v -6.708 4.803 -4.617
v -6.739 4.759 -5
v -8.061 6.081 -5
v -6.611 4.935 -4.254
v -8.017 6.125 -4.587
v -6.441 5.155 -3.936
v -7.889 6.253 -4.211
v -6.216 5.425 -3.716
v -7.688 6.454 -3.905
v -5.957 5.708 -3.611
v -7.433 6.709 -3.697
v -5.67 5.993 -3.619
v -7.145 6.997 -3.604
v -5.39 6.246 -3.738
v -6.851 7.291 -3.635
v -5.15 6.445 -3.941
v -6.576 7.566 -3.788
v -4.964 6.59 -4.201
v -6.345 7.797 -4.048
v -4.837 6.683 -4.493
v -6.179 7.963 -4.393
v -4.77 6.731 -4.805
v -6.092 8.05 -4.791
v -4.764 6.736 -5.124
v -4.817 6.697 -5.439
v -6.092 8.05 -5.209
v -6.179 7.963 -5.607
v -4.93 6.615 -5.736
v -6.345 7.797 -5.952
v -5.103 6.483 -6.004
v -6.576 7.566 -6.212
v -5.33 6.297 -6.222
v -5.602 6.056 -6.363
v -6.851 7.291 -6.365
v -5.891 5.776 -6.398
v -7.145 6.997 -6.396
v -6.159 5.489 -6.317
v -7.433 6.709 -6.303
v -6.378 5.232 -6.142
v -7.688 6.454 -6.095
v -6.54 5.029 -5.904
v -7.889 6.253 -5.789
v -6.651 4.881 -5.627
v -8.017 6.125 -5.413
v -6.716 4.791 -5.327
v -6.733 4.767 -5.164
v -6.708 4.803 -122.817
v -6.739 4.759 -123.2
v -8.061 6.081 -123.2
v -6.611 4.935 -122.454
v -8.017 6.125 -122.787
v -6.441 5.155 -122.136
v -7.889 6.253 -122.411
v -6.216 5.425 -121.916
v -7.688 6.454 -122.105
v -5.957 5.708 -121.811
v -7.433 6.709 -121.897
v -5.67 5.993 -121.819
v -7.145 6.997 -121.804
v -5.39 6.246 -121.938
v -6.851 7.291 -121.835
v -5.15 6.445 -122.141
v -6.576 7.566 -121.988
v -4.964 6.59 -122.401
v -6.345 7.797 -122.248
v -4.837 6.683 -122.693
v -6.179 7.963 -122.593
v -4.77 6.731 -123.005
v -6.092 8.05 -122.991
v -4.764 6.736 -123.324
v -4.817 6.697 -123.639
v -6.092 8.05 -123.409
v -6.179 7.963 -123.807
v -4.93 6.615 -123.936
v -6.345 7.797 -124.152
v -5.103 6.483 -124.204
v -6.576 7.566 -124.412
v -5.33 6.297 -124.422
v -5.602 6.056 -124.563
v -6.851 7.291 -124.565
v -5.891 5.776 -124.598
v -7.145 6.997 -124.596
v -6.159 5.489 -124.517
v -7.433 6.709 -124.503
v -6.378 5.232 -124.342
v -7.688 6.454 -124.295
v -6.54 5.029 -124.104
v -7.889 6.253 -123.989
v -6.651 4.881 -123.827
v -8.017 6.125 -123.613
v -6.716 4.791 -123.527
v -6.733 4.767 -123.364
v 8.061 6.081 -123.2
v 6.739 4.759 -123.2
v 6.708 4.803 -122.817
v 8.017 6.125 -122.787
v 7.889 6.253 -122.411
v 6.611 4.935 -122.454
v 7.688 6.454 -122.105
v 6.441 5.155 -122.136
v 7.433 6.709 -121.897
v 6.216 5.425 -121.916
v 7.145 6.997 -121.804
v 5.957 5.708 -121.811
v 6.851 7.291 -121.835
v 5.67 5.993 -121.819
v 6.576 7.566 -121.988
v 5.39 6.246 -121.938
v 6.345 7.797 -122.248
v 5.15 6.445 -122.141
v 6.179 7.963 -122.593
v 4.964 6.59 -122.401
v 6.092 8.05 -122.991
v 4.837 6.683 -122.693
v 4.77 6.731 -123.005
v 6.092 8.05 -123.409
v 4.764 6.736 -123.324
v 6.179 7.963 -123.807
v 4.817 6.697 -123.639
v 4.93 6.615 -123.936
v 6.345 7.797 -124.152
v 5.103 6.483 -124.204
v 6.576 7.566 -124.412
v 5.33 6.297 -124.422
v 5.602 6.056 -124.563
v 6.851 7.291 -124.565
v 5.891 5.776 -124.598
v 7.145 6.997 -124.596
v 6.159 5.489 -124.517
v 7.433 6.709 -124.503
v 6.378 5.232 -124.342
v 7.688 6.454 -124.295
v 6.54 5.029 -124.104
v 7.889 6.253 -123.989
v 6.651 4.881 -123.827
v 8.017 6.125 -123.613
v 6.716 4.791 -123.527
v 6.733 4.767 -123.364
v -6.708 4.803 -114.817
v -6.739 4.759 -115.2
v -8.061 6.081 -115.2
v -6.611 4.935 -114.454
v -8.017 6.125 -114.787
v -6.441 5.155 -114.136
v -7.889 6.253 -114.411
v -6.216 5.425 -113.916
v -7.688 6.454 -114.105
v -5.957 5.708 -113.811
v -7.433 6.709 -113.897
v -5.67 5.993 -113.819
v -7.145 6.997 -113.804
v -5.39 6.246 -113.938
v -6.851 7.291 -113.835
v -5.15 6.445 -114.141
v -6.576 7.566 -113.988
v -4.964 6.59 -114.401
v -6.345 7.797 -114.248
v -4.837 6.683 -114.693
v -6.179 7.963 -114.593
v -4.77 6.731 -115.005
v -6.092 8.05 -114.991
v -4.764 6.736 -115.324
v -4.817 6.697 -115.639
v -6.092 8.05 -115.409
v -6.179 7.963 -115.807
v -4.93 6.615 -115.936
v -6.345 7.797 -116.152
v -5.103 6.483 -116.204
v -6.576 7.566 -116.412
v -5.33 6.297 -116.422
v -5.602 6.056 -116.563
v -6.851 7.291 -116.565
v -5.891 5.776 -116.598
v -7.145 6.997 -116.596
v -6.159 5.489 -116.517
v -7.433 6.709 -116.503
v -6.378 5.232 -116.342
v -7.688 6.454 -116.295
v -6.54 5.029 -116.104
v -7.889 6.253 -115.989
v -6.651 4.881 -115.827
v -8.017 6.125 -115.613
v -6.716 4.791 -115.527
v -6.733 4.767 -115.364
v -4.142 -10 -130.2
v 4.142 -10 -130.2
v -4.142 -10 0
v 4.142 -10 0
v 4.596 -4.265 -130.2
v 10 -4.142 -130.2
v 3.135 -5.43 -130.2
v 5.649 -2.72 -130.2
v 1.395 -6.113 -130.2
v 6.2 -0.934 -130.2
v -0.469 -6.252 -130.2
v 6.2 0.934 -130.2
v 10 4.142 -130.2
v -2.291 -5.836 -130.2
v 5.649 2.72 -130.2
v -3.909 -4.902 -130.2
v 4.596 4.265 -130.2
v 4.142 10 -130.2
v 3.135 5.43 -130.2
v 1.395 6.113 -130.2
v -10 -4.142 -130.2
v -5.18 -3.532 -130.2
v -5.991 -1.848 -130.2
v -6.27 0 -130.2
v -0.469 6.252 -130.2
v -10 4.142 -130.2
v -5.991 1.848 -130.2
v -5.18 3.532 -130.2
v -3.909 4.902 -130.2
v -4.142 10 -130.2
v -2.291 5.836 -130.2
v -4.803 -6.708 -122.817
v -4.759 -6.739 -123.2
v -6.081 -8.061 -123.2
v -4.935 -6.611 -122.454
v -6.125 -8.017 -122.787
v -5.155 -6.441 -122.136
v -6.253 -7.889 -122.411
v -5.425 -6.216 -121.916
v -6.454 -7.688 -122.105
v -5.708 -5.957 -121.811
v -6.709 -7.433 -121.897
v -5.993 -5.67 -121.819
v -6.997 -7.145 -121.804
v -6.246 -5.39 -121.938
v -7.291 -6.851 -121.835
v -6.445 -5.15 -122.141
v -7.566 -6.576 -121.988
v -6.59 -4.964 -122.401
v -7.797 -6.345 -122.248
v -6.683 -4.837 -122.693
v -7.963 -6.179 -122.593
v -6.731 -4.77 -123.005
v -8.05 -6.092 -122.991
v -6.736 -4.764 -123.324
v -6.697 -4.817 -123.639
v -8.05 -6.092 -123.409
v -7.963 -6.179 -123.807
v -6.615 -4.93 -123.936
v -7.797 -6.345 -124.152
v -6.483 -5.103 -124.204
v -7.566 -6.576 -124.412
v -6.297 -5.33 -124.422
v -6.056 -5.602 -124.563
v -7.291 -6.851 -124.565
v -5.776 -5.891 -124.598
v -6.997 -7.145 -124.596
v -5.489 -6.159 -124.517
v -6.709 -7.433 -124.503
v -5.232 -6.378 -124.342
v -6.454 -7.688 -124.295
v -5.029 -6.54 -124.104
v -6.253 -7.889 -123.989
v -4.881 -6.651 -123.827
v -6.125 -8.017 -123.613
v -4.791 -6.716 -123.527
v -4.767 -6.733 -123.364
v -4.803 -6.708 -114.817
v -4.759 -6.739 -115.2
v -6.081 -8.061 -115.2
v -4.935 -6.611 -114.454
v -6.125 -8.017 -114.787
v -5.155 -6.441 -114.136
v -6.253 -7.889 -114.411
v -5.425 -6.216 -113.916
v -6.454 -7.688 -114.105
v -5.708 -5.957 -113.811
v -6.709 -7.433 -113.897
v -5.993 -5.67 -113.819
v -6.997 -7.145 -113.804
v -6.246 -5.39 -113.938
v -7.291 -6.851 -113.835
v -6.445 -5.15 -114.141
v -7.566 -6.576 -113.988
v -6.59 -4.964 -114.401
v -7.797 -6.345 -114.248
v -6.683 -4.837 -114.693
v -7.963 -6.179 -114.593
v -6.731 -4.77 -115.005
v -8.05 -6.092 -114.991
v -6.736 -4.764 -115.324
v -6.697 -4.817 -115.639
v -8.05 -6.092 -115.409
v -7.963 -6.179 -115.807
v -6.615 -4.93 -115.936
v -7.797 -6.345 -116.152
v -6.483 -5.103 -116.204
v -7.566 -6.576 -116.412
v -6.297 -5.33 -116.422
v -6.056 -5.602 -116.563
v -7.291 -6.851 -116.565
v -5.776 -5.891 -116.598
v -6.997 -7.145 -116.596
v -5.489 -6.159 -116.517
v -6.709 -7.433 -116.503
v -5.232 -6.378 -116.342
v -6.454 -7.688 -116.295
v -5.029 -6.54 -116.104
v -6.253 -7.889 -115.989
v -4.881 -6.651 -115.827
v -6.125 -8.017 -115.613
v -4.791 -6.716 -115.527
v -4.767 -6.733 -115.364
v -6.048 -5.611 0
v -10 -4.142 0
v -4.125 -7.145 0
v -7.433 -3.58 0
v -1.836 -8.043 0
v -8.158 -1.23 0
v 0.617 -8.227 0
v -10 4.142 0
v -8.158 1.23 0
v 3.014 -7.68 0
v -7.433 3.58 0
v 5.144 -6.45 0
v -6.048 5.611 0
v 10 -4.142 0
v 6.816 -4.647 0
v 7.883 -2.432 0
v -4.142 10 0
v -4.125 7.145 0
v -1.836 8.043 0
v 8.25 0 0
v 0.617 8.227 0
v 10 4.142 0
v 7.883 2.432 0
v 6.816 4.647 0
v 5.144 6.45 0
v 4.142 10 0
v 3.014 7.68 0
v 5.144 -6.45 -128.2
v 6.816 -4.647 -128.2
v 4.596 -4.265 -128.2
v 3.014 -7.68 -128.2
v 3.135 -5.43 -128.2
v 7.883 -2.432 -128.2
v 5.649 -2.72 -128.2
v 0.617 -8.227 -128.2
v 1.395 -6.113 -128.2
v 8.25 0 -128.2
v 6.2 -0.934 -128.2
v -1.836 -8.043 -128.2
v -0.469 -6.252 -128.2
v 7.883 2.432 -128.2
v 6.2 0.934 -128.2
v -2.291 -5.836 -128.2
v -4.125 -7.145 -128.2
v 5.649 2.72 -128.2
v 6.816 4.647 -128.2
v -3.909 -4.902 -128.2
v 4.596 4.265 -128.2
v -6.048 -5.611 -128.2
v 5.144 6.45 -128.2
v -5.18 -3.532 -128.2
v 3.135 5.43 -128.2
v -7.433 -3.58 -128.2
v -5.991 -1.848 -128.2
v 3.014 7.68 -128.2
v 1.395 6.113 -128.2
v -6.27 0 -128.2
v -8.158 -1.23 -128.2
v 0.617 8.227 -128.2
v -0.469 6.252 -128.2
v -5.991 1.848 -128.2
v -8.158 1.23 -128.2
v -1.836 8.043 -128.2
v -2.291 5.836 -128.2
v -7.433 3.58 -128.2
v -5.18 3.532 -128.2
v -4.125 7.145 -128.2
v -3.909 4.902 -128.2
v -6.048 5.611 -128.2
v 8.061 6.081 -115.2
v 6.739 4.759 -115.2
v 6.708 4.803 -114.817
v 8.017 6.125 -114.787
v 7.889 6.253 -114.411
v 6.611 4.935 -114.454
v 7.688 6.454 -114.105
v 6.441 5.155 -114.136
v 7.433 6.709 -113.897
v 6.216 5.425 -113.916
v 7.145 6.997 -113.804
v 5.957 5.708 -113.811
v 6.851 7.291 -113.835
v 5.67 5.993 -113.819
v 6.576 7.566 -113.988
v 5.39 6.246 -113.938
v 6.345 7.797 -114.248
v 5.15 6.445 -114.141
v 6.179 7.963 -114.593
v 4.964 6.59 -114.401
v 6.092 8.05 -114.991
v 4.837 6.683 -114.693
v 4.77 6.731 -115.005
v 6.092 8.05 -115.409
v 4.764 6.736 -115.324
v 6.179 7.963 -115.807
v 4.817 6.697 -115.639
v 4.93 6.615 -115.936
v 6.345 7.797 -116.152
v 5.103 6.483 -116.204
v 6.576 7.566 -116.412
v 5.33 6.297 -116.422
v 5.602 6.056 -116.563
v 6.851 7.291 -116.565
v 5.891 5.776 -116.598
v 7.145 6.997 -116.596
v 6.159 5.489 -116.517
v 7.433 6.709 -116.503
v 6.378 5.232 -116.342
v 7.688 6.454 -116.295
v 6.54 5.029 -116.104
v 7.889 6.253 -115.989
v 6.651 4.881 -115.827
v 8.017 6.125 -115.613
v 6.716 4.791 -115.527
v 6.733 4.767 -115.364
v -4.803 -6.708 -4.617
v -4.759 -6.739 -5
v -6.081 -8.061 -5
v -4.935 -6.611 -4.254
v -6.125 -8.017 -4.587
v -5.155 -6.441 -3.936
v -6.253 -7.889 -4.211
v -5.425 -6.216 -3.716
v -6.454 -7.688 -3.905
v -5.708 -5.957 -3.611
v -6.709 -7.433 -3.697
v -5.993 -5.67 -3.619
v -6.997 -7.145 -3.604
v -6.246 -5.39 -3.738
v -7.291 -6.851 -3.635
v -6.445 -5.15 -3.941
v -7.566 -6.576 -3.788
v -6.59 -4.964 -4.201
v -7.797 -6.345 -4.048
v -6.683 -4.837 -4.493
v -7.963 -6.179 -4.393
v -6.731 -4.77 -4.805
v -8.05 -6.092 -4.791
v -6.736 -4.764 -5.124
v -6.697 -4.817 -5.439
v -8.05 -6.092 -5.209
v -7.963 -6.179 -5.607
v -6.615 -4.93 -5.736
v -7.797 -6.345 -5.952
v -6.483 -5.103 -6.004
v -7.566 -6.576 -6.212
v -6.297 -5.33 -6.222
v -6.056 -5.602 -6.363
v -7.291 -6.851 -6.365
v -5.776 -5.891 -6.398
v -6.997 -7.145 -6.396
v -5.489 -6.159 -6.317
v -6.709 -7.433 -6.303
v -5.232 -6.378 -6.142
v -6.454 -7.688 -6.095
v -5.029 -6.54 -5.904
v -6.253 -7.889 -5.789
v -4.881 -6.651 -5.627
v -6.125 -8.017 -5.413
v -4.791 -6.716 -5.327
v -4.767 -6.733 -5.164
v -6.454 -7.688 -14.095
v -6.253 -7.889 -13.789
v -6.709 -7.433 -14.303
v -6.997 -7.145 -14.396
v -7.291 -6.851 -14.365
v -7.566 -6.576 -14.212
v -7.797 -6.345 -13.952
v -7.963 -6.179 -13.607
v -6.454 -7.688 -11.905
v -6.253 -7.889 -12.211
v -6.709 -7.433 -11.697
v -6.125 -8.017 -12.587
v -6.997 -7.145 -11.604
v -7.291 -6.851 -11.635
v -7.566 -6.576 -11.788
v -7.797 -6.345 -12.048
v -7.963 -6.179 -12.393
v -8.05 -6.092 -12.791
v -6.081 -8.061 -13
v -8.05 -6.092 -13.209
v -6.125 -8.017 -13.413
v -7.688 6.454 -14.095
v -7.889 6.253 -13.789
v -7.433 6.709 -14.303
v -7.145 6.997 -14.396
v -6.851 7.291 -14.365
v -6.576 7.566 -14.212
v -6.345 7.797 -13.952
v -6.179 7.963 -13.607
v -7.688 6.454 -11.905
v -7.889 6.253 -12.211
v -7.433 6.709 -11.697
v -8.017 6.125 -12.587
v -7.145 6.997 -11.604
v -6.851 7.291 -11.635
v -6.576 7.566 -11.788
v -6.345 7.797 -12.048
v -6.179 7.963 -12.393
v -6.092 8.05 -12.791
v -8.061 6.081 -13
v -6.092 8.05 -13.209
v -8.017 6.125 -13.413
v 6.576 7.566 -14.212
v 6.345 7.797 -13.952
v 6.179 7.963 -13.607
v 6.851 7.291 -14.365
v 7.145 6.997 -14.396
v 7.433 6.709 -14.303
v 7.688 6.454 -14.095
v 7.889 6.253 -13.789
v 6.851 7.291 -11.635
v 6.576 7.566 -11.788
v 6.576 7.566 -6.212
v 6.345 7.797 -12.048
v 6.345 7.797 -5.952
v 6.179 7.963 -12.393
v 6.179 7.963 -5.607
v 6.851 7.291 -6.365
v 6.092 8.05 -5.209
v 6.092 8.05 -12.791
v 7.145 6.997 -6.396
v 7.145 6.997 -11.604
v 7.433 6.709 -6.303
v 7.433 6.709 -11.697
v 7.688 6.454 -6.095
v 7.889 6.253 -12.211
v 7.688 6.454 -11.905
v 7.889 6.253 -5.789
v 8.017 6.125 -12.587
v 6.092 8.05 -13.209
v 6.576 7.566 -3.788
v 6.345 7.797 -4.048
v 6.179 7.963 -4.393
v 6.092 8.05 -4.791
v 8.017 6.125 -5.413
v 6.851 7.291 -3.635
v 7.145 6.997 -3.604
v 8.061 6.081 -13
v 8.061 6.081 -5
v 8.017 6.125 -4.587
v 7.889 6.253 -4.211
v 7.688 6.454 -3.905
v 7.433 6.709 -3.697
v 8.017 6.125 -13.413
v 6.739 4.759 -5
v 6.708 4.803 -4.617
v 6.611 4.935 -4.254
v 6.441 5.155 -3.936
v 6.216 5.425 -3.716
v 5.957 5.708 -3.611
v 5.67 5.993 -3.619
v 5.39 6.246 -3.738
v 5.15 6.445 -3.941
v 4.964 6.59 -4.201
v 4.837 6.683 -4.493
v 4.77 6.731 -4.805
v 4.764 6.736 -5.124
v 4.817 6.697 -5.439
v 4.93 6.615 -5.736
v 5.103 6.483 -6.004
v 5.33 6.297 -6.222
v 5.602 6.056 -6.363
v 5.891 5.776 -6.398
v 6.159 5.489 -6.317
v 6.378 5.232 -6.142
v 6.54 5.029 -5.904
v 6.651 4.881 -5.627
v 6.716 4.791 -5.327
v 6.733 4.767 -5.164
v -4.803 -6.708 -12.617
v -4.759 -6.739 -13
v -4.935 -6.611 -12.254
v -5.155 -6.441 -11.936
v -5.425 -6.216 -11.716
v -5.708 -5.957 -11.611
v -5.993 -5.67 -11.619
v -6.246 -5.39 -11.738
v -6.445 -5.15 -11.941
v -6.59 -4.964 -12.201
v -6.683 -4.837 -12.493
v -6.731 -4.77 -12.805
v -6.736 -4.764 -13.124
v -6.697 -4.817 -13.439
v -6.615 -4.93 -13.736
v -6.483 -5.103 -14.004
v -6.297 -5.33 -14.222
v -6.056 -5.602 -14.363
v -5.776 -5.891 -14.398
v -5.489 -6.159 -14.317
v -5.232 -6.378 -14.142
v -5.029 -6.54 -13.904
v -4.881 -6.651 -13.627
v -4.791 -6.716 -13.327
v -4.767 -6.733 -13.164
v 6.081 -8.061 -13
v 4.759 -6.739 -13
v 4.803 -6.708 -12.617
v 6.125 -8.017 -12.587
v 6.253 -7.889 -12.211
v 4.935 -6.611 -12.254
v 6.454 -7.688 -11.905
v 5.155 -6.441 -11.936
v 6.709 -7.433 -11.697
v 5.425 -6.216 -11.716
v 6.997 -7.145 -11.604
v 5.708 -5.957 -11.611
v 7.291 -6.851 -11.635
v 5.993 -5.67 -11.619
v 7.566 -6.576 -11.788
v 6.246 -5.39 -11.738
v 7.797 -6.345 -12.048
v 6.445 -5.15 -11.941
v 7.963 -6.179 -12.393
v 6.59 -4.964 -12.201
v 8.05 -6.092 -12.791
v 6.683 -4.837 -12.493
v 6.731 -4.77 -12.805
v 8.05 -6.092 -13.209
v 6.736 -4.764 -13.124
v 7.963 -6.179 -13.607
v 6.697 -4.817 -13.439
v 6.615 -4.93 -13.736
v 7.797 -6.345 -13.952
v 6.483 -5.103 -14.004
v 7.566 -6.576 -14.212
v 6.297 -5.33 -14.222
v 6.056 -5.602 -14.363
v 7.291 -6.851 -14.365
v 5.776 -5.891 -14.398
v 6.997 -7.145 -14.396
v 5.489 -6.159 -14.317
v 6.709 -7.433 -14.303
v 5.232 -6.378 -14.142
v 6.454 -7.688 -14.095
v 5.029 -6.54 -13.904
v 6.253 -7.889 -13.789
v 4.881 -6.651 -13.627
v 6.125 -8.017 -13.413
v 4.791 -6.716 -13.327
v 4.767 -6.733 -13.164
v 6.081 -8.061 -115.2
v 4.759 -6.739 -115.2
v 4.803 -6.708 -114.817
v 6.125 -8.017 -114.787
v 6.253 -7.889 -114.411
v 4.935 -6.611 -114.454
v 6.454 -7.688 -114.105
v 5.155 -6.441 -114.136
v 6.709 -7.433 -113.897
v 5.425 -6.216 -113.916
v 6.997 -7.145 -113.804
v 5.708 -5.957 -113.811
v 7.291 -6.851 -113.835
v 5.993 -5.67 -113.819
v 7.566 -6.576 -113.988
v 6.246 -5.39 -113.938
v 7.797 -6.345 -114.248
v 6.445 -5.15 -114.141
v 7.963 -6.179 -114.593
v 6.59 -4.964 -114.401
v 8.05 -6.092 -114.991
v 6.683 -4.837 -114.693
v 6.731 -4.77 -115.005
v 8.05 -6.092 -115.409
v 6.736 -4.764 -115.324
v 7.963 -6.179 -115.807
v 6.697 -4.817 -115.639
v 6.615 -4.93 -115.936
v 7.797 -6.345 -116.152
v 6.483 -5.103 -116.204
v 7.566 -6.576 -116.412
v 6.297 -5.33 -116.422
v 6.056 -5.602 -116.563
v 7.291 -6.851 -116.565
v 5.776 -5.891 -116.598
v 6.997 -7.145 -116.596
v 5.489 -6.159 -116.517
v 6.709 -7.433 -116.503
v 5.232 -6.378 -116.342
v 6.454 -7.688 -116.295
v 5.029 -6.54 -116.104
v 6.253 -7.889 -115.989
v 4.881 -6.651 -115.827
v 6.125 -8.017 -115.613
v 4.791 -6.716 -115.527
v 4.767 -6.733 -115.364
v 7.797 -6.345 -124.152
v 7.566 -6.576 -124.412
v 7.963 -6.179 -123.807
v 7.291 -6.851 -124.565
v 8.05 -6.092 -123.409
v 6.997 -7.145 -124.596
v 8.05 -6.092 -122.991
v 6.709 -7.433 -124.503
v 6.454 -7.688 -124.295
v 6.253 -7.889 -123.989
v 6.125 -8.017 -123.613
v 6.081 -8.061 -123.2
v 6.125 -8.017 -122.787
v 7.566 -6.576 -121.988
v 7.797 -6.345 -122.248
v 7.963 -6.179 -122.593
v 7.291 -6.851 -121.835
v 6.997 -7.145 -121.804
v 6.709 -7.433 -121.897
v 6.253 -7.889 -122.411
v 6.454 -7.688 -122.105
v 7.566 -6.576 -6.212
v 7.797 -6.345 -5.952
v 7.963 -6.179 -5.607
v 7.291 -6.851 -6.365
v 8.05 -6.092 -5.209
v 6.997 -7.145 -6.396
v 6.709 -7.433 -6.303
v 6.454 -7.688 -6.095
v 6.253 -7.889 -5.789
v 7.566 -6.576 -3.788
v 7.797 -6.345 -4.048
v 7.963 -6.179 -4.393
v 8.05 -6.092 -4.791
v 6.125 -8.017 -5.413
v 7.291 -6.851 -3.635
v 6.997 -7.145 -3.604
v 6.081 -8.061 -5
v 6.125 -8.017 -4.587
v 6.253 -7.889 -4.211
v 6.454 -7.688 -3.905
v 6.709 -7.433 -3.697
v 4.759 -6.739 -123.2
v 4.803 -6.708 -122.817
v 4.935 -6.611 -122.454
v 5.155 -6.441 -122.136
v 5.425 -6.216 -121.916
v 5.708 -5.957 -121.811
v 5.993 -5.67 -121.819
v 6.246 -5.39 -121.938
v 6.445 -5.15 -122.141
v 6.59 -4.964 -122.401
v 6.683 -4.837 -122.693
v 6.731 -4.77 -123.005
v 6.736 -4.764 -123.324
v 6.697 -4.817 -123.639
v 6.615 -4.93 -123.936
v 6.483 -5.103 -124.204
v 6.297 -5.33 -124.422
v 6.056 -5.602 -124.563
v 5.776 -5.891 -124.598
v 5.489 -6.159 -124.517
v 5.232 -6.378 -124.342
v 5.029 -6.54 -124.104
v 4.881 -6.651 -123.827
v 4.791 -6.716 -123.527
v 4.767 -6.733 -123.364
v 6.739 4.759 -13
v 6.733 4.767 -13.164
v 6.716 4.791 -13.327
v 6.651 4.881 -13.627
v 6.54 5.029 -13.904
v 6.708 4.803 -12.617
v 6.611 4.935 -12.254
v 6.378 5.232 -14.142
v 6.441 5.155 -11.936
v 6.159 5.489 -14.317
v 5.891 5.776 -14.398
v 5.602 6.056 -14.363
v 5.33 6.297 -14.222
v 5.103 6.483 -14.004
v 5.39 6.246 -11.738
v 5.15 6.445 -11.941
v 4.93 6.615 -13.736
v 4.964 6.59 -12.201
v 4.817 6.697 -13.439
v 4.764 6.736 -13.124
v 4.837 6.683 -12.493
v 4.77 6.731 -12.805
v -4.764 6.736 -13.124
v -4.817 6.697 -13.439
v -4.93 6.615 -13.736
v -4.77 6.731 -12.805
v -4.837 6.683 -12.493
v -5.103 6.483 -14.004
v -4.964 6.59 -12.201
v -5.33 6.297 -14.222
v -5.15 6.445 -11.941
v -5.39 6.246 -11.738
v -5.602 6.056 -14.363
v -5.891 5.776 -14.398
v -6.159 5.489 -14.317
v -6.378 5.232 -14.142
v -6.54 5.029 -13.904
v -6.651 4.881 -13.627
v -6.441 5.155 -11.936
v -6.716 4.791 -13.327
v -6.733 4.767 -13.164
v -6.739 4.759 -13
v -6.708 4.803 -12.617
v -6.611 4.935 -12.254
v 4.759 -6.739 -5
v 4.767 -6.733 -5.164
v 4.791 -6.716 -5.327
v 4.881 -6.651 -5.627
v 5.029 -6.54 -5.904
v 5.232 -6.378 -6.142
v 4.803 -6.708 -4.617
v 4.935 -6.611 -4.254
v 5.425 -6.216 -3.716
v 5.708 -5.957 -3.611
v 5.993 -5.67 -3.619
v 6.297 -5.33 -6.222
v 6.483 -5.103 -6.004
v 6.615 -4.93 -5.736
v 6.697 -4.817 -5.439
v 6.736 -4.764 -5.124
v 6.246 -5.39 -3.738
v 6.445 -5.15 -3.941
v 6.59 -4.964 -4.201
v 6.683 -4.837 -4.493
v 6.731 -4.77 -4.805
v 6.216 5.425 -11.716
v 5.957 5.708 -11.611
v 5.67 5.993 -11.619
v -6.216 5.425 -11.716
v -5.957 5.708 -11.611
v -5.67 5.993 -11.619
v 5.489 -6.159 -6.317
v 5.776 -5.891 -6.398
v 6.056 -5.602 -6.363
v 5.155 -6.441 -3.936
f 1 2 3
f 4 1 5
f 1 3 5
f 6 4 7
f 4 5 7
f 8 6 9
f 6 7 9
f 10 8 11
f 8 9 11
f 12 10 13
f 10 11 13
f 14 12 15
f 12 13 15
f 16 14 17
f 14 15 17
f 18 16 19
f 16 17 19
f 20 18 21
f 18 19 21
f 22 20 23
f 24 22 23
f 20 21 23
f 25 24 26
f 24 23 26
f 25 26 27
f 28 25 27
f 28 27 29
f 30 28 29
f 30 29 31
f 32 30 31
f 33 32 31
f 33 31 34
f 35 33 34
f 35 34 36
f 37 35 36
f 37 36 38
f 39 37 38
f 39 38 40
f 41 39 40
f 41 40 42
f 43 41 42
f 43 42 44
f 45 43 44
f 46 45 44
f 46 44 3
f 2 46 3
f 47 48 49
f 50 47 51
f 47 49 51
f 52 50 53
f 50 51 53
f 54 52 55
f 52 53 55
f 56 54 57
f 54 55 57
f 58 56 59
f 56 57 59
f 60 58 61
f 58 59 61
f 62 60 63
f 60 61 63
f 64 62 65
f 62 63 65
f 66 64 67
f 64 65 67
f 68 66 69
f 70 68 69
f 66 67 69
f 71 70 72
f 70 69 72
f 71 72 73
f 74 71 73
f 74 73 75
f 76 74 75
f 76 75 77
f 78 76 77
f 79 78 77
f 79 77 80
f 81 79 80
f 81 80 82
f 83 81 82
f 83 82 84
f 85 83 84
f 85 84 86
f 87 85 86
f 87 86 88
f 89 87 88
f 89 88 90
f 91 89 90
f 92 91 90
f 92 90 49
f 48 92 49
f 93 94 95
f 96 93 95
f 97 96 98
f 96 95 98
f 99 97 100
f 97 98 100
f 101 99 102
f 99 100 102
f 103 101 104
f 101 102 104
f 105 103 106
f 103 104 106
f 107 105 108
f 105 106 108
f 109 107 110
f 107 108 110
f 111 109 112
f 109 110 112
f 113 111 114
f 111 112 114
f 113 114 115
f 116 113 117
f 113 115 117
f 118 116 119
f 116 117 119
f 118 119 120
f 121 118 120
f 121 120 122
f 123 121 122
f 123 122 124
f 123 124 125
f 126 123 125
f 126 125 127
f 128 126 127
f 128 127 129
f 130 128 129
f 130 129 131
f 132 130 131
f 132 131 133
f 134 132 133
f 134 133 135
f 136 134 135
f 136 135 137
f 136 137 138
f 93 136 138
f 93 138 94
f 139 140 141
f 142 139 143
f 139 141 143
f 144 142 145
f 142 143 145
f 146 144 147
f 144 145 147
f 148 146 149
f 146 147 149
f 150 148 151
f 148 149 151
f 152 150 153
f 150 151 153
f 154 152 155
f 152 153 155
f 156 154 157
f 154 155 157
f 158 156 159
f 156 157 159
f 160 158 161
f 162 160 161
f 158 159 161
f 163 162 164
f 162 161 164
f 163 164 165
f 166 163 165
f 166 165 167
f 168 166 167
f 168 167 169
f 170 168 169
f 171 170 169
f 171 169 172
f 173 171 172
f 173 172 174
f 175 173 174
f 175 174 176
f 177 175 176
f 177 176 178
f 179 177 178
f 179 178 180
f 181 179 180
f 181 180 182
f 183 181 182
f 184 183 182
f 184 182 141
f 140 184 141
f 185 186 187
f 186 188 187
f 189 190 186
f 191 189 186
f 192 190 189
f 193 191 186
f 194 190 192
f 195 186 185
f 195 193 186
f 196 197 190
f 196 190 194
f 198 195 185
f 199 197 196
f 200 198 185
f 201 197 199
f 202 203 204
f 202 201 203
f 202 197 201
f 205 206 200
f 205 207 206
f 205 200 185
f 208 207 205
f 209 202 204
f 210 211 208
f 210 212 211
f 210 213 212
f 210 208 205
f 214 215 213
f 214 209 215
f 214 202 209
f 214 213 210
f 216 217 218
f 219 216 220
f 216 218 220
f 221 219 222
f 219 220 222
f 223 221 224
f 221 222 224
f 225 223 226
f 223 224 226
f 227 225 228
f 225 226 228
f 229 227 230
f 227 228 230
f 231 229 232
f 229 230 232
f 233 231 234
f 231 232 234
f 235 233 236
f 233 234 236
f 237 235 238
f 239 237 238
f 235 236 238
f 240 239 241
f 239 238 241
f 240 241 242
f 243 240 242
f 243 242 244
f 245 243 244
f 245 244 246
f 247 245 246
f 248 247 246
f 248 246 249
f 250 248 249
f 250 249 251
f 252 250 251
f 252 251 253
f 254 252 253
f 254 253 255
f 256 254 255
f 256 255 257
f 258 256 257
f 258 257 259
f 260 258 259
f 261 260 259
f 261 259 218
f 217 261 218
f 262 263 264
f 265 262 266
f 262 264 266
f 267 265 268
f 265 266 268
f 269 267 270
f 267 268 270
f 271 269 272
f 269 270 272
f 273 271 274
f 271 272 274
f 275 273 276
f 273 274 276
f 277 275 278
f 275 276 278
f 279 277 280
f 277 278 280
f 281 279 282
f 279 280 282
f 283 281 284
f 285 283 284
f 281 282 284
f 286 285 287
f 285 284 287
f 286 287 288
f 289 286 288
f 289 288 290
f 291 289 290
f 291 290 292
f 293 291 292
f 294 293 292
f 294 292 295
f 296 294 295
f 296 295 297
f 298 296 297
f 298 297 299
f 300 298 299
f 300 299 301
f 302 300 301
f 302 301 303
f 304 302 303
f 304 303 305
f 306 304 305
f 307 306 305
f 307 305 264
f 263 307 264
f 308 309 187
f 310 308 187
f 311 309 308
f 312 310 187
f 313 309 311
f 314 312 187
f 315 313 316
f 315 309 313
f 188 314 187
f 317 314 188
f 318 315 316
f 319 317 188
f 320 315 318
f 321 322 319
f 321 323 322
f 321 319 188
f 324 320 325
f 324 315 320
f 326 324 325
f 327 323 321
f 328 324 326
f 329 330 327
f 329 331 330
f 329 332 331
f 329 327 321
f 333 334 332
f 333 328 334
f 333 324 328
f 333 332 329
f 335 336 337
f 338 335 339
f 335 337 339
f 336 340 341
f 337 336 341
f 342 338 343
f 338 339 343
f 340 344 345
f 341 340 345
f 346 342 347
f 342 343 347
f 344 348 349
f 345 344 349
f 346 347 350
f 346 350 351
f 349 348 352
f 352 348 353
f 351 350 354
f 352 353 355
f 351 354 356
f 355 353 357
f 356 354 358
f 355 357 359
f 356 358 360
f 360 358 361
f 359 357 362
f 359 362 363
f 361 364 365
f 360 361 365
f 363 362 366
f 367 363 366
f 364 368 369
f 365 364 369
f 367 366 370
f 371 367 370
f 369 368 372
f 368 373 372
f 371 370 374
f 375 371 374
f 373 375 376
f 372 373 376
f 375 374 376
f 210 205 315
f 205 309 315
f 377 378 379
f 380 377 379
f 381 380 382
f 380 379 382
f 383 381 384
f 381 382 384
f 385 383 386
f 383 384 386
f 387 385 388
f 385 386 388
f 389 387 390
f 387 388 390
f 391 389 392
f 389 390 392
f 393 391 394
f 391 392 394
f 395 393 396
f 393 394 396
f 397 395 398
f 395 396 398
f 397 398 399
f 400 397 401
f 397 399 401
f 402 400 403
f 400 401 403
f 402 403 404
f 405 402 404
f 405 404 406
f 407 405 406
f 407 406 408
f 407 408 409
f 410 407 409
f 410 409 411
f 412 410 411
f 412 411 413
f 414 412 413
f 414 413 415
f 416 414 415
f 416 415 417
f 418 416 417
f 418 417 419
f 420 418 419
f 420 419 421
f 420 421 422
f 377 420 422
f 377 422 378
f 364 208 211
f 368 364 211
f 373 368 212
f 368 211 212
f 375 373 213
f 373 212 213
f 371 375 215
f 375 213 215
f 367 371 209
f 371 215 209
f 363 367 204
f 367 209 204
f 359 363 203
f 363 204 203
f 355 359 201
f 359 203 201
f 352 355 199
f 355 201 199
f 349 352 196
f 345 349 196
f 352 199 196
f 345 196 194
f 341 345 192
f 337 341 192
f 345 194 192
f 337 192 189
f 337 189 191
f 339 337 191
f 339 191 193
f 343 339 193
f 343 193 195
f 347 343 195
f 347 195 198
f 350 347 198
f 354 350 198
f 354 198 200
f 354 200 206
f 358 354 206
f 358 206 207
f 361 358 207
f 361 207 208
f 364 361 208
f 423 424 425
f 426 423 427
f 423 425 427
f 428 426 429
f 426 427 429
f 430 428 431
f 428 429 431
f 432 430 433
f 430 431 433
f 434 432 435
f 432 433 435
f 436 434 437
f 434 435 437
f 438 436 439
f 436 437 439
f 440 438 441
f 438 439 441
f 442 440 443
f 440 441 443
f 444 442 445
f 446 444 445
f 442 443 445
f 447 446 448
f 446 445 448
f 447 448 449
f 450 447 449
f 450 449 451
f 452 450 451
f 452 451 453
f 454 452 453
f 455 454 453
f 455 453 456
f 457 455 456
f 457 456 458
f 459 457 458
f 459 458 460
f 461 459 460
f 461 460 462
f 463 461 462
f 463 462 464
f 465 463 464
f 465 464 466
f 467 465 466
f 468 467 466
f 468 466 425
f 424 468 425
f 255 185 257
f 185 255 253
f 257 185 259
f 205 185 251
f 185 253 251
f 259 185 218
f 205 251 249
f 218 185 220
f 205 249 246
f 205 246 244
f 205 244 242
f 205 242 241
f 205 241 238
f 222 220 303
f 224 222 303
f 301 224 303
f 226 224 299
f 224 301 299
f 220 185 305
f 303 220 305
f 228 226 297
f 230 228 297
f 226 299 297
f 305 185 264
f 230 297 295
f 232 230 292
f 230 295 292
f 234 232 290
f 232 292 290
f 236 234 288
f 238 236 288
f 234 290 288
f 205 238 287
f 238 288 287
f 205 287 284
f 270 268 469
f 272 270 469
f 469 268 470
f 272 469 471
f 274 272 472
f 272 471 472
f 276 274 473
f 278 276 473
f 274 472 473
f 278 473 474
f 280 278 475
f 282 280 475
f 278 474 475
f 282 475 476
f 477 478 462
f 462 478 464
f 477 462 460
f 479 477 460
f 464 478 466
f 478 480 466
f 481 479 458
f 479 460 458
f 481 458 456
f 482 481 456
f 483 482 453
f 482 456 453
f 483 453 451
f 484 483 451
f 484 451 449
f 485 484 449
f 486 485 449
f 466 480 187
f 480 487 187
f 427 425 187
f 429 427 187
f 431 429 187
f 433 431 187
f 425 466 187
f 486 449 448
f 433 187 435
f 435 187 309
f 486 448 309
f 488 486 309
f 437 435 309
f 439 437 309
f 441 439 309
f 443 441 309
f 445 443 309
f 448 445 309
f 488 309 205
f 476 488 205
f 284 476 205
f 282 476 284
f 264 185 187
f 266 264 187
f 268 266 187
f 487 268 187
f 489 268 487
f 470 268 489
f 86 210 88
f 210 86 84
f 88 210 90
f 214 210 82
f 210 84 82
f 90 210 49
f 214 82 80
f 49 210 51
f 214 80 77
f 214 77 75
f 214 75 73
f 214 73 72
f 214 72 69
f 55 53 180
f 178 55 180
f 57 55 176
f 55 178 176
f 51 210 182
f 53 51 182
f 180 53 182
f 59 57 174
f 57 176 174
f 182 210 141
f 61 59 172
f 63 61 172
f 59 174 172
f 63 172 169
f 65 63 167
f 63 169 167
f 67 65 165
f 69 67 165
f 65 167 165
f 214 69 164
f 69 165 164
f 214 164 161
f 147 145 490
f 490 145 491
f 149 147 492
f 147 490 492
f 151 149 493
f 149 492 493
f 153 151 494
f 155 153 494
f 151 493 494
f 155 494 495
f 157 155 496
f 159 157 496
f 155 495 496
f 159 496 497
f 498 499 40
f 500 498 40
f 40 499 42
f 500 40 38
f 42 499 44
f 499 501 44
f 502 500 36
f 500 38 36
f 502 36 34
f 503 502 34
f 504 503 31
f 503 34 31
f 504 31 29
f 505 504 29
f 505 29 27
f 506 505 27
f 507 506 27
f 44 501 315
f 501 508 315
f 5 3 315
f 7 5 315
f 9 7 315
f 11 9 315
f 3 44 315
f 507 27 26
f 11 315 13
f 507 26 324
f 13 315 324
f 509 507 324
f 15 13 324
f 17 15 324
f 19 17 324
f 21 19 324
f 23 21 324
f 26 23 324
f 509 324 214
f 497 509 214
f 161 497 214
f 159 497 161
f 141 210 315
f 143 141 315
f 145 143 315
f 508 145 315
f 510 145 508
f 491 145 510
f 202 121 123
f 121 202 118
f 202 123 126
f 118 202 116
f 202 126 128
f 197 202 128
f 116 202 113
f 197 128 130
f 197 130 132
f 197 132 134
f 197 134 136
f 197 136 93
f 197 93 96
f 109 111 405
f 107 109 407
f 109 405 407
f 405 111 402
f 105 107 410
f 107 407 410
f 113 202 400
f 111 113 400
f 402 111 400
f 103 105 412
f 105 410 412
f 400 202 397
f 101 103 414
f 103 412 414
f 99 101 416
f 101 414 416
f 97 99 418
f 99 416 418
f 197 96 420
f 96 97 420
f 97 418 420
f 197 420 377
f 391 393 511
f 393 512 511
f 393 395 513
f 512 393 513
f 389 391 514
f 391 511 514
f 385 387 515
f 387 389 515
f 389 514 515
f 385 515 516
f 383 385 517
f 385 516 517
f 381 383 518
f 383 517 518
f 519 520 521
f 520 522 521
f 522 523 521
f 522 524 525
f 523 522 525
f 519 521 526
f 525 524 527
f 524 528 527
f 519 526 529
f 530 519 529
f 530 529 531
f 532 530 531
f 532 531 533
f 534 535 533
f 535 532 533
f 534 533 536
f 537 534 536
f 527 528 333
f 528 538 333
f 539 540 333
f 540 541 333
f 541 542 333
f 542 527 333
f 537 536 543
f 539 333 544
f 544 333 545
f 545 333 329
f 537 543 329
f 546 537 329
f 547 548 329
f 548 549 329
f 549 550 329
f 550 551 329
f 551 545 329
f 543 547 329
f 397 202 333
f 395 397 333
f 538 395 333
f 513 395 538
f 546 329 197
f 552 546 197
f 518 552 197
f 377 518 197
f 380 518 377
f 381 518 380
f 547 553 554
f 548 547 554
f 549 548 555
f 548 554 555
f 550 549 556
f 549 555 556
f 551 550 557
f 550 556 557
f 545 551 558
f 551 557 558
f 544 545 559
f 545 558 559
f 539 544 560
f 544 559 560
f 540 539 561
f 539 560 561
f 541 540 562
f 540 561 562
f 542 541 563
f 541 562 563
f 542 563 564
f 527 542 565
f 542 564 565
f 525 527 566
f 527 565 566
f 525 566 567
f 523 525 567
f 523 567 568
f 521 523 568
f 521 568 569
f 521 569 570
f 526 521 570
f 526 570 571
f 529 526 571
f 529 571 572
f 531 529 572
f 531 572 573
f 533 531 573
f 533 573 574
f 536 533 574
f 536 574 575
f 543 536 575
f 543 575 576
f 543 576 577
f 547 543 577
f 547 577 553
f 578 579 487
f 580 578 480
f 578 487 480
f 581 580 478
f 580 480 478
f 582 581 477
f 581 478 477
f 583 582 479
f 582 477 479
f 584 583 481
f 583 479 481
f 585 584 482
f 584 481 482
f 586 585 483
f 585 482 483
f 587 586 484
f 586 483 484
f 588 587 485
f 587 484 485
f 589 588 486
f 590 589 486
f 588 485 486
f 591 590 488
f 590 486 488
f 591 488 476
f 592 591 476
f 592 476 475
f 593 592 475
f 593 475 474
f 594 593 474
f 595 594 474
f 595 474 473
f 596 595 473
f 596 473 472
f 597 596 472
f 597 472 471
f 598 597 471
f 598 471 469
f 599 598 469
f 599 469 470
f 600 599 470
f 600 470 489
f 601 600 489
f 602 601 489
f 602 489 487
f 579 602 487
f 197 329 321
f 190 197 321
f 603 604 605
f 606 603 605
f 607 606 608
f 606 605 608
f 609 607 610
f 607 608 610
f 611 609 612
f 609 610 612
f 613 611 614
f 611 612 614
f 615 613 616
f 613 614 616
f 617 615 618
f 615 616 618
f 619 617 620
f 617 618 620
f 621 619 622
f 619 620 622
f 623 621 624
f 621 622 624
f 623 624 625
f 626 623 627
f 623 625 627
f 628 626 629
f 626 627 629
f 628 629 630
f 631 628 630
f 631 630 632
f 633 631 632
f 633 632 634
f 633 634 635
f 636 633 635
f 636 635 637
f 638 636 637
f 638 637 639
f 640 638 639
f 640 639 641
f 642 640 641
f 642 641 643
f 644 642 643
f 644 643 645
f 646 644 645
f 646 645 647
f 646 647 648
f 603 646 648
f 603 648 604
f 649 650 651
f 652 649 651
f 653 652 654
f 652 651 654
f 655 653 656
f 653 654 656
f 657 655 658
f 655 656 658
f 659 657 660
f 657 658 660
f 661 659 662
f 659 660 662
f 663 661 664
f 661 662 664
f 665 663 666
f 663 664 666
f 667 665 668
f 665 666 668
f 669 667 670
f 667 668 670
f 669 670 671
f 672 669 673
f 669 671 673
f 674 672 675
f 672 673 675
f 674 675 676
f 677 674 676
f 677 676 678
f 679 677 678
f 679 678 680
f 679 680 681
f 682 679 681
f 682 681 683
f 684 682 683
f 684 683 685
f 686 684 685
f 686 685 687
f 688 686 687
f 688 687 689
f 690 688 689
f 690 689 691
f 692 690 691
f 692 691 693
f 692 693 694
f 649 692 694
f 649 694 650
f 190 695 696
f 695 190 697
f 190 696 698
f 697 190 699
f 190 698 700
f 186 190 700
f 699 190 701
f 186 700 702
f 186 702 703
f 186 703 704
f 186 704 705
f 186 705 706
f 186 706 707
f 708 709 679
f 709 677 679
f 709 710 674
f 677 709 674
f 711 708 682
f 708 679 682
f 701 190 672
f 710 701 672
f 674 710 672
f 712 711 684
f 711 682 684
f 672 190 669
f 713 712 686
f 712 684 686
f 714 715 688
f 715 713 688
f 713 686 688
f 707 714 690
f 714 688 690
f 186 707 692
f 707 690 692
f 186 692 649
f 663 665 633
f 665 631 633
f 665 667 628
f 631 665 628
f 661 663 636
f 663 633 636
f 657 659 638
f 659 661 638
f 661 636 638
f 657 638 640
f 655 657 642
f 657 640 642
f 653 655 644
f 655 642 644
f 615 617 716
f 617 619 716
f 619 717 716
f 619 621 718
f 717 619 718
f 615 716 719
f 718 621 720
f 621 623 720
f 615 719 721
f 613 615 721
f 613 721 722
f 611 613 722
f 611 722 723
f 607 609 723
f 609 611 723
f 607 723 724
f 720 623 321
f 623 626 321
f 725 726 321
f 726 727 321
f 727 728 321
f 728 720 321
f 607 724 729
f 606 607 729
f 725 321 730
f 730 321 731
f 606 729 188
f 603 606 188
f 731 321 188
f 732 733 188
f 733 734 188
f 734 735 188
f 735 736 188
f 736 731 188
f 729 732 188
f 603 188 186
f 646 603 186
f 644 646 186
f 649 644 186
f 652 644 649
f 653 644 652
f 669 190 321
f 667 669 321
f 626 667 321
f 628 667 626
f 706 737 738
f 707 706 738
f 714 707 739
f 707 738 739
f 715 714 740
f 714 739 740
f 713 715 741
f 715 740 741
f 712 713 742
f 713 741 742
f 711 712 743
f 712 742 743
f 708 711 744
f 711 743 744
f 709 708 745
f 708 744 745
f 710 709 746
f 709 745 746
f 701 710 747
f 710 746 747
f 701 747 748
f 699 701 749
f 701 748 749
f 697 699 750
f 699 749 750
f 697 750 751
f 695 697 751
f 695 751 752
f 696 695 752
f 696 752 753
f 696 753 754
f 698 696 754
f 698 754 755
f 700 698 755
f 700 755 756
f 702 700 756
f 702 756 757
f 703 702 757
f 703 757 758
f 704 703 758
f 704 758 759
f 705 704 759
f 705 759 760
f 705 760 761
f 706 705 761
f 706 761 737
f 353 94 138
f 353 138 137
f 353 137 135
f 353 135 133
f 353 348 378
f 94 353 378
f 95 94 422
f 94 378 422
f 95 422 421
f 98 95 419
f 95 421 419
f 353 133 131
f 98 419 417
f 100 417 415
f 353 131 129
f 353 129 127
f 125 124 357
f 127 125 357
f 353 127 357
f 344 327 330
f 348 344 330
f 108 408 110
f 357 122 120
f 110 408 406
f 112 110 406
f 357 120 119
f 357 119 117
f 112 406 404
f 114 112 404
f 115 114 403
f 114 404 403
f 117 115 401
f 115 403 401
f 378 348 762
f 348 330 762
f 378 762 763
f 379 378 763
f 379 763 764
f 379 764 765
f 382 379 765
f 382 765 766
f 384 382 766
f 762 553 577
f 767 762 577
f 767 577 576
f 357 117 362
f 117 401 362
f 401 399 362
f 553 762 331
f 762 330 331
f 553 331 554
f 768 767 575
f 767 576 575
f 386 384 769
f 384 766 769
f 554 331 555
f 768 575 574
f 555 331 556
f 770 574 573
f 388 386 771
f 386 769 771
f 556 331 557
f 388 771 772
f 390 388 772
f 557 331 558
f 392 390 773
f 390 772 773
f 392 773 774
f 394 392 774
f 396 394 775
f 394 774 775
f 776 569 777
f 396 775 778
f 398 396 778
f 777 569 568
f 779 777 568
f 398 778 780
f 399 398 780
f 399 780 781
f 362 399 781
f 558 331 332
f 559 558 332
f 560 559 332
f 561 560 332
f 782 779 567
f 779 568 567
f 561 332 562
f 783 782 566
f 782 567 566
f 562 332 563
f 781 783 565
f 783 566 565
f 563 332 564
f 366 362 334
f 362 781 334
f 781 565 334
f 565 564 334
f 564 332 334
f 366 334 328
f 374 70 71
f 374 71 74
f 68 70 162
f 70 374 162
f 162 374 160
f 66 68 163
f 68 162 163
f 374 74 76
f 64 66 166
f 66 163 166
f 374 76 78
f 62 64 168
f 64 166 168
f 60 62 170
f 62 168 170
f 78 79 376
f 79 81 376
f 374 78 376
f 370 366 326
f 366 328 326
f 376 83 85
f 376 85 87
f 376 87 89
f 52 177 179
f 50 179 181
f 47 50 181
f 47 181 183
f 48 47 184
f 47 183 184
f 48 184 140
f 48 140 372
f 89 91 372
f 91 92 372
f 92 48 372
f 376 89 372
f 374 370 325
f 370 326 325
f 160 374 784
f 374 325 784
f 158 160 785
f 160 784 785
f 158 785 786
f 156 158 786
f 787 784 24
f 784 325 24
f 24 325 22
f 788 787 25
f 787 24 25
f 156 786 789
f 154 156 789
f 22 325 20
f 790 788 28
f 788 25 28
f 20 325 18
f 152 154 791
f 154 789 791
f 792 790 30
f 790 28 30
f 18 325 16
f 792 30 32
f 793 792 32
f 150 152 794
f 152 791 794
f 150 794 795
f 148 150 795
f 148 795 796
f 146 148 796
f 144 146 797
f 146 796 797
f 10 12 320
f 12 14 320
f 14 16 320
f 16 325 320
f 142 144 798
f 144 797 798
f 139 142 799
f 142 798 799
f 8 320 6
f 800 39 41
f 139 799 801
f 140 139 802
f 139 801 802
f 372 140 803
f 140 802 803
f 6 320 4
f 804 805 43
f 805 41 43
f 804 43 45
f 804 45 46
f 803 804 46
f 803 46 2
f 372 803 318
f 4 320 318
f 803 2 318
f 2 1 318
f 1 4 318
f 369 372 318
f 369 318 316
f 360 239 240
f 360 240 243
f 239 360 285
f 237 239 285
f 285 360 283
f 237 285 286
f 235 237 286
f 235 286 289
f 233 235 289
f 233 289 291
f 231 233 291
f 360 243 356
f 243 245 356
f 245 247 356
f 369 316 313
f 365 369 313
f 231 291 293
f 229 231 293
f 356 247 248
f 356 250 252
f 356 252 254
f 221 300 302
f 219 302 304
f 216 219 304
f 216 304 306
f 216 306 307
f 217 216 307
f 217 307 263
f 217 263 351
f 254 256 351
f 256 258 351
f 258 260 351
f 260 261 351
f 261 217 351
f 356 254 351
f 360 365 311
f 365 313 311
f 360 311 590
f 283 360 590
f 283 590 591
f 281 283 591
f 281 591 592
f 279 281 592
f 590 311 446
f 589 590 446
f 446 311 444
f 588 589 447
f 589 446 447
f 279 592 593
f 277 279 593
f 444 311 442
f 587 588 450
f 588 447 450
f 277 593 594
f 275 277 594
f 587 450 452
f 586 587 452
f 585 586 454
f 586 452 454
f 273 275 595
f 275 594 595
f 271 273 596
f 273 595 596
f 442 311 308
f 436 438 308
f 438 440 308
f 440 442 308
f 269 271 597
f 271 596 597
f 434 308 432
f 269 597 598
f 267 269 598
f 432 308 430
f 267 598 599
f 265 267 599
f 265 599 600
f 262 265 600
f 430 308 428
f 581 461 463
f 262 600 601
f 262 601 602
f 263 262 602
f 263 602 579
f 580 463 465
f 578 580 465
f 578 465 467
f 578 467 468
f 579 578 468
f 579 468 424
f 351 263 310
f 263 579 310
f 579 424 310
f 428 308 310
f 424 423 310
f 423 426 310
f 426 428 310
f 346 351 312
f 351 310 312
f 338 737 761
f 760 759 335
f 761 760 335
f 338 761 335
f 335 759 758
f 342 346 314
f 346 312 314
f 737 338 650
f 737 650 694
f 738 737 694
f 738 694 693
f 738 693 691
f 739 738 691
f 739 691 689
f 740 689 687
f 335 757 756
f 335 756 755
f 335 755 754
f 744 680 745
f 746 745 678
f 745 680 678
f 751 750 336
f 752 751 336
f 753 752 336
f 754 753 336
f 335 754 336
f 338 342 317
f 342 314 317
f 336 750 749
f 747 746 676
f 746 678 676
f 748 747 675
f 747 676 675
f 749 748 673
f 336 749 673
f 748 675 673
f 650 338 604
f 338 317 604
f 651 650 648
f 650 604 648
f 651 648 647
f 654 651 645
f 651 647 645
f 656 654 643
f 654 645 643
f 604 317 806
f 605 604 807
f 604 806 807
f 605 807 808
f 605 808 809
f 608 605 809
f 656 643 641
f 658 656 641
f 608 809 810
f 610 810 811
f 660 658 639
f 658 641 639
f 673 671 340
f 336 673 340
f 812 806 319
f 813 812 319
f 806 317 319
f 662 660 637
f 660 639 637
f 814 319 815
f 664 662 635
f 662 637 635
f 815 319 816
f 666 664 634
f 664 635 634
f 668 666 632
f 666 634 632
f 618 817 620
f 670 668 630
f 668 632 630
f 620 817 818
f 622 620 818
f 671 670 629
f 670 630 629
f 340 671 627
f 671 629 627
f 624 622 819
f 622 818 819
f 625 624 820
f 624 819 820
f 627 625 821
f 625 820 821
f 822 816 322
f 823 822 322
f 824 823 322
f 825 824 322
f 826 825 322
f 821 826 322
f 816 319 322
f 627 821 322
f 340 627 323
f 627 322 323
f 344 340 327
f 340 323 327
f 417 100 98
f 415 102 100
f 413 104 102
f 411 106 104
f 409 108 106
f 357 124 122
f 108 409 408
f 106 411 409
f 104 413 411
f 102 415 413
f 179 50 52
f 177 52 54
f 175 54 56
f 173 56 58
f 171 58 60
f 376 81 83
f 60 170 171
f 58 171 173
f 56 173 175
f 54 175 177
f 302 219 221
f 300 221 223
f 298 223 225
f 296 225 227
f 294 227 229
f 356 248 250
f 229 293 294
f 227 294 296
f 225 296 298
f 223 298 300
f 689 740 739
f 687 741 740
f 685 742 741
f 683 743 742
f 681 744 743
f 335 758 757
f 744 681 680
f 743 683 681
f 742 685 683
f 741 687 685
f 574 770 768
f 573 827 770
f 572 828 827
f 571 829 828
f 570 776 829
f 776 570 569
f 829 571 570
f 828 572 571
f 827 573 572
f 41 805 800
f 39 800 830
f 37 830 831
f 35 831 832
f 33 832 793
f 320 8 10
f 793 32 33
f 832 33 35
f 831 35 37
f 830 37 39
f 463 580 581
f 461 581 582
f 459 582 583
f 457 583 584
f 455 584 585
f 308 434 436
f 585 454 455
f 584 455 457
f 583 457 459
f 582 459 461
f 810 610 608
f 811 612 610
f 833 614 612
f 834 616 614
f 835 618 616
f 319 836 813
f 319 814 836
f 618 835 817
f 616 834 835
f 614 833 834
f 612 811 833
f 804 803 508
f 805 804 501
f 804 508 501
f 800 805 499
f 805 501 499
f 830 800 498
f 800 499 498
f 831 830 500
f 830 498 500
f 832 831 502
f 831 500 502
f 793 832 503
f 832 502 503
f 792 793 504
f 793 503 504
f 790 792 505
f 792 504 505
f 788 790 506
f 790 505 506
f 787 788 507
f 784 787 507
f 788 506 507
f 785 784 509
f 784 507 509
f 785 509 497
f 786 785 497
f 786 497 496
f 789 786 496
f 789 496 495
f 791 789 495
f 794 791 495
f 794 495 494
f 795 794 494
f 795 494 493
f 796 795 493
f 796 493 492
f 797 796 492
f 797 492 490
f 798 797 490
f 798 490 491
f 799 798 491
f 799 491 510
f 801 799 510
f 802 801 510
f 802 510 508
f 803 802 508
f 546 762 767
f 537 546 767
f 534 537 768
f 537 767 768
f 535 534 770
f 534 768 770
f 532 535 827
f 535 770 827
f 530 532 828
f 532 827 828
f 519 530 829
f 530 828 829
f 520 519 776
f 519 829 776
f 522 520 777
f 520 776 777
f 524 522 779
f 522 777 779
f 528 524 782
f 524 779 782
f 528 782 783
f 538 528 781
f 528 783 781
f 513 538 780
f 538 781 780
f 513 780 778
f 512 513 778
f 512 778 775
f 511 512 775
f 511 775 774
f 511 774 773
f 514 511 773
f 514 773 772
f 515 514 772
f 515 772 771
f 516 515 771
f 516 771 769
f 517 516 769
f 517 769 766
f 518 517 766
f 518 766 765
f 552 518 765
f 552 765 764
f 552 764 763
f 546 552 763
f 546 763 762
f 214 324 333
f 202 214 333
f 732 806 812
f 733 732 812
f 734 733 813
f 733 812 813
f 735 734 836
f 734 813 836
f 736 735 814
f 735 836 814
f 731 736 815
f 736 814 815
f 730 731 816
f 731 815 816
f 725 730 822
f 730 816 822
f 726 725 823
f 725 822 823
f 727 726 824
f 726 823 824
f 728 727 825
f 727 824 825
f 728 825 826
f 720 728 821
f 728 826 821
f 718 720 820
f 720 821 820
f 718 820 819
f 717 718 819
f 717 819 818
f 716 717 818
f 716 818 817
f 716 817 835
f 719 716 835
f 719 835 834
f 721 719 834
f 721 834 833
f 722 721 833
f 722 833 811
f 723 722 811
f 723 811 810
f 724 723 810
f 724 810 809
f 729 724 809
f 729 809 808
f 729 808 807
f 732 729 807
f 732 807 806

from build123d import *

# Parameters (mm, degrees)
SKETCH1_R           = 8.25
BOSS_EXTRUDE1_DEPTH = 128.2
BOSS_EXTRUDE2_DEPTH = 2
SKETCH6_R           = 1.4
CUT_EXTRUDE2_DEPTH  = 133.419344178
CIRPATTERN1_COUNT   = 2
CIRPATTERN1_ANGLE   = 270
SKETCH7_R           = 6.269832862
CUT_EXTRUDE3_DEPTH  = 131.965797161


with BuildPart() as part:
    # Sketch1 → Boss-Extrude1 (new body)
    with BuildSketch(Plane.XY):
        Polygon((10, 4.142135624), (4.142135624, 10), (-4.142135624, 10), (-10, 4.142135624), (-10, -4.142135624), (-4.142135624, -10), (4.142135624, -10), (10, -4.142135624), align=None)
        Circle(SKETCH1_R, mode=Mode.SUBTRACT)
    extrude(amount=-BOSS_EXTRUDE1_DEPTH)

    # Sketch2 → Boss-Extrude2 (add)
    with BuildSketch(Plane(origin=(0, 0, -128.2), x_dir=(-1, 0, 0), z_dir=(0, 0, -1))):
        Polygon((-10, 4.142135624), (-10, -4.142135624), (-4.142135624, -10), (4.142135624, -10), (10, -4.142135624), (10, 4.142135624), (4.142135624, 10), (-4.142135624, 10), align=None)
    extrude(amount=BOSS_EXTRUDE2_DEPTH)

    # Sketch6 → Cut-Extrude2 (cut, through all)
    with BuildSketch(Plane(origin=(-7.071067812, 7.071067812, 0), x_dir=(0, 0, 1), z_dir=(-0.7071067811865476, 0.7071067811865476, 0))):
        with Locations(Location((-13, 0, 0), (0, 0, 270))):
            Circle(SKETCH6_R)
        with Locations(Location((-5, 0, 0), (0, 0, 270))):
            Circle(SKETCH6_R)
        with Locations(Location((-115.2, 0, 0), (0, 0, 270))):
            Circle(SKETCH6_R)
        with Locations(Location((-123.2, 0, 0), (0, 0, 270))):
            Circle(SKETCH6_R)
    cut_extrude2 = extrude(amount=-CUT_EXTRUDE2_DEPTH, mode=Mode.SUBTRACT)

    # CirPattern1: Cut-Extrude2 ×2 about axis
    cirpattern1_axis = Axis((0, 0, 6.85), (0, 0, -1))
    for i in range(1, CIRPATTERN1_COUNT):
        add(cut_extrude2.rotate(cirpattern1_axis, i * CIRPATTERN1_ANGLE / (CIRPATTERN1_COUNT - 1)), mode=Mode.SUBTRACT)

    # Sketch7 → Cut-Extrude3 (cut, through all)
    with BuildSketch(Plane(origin=(0, 0, -130.2), x_dir=(-1, 0, 0), z_dir=(0, 0, -1))):
        Circle(SKETCH7_R)
    extrude(amount=-CUT_EXTRUDE3_DEPTH, mode=Mode.SUBTRACT)


solid = part.part
